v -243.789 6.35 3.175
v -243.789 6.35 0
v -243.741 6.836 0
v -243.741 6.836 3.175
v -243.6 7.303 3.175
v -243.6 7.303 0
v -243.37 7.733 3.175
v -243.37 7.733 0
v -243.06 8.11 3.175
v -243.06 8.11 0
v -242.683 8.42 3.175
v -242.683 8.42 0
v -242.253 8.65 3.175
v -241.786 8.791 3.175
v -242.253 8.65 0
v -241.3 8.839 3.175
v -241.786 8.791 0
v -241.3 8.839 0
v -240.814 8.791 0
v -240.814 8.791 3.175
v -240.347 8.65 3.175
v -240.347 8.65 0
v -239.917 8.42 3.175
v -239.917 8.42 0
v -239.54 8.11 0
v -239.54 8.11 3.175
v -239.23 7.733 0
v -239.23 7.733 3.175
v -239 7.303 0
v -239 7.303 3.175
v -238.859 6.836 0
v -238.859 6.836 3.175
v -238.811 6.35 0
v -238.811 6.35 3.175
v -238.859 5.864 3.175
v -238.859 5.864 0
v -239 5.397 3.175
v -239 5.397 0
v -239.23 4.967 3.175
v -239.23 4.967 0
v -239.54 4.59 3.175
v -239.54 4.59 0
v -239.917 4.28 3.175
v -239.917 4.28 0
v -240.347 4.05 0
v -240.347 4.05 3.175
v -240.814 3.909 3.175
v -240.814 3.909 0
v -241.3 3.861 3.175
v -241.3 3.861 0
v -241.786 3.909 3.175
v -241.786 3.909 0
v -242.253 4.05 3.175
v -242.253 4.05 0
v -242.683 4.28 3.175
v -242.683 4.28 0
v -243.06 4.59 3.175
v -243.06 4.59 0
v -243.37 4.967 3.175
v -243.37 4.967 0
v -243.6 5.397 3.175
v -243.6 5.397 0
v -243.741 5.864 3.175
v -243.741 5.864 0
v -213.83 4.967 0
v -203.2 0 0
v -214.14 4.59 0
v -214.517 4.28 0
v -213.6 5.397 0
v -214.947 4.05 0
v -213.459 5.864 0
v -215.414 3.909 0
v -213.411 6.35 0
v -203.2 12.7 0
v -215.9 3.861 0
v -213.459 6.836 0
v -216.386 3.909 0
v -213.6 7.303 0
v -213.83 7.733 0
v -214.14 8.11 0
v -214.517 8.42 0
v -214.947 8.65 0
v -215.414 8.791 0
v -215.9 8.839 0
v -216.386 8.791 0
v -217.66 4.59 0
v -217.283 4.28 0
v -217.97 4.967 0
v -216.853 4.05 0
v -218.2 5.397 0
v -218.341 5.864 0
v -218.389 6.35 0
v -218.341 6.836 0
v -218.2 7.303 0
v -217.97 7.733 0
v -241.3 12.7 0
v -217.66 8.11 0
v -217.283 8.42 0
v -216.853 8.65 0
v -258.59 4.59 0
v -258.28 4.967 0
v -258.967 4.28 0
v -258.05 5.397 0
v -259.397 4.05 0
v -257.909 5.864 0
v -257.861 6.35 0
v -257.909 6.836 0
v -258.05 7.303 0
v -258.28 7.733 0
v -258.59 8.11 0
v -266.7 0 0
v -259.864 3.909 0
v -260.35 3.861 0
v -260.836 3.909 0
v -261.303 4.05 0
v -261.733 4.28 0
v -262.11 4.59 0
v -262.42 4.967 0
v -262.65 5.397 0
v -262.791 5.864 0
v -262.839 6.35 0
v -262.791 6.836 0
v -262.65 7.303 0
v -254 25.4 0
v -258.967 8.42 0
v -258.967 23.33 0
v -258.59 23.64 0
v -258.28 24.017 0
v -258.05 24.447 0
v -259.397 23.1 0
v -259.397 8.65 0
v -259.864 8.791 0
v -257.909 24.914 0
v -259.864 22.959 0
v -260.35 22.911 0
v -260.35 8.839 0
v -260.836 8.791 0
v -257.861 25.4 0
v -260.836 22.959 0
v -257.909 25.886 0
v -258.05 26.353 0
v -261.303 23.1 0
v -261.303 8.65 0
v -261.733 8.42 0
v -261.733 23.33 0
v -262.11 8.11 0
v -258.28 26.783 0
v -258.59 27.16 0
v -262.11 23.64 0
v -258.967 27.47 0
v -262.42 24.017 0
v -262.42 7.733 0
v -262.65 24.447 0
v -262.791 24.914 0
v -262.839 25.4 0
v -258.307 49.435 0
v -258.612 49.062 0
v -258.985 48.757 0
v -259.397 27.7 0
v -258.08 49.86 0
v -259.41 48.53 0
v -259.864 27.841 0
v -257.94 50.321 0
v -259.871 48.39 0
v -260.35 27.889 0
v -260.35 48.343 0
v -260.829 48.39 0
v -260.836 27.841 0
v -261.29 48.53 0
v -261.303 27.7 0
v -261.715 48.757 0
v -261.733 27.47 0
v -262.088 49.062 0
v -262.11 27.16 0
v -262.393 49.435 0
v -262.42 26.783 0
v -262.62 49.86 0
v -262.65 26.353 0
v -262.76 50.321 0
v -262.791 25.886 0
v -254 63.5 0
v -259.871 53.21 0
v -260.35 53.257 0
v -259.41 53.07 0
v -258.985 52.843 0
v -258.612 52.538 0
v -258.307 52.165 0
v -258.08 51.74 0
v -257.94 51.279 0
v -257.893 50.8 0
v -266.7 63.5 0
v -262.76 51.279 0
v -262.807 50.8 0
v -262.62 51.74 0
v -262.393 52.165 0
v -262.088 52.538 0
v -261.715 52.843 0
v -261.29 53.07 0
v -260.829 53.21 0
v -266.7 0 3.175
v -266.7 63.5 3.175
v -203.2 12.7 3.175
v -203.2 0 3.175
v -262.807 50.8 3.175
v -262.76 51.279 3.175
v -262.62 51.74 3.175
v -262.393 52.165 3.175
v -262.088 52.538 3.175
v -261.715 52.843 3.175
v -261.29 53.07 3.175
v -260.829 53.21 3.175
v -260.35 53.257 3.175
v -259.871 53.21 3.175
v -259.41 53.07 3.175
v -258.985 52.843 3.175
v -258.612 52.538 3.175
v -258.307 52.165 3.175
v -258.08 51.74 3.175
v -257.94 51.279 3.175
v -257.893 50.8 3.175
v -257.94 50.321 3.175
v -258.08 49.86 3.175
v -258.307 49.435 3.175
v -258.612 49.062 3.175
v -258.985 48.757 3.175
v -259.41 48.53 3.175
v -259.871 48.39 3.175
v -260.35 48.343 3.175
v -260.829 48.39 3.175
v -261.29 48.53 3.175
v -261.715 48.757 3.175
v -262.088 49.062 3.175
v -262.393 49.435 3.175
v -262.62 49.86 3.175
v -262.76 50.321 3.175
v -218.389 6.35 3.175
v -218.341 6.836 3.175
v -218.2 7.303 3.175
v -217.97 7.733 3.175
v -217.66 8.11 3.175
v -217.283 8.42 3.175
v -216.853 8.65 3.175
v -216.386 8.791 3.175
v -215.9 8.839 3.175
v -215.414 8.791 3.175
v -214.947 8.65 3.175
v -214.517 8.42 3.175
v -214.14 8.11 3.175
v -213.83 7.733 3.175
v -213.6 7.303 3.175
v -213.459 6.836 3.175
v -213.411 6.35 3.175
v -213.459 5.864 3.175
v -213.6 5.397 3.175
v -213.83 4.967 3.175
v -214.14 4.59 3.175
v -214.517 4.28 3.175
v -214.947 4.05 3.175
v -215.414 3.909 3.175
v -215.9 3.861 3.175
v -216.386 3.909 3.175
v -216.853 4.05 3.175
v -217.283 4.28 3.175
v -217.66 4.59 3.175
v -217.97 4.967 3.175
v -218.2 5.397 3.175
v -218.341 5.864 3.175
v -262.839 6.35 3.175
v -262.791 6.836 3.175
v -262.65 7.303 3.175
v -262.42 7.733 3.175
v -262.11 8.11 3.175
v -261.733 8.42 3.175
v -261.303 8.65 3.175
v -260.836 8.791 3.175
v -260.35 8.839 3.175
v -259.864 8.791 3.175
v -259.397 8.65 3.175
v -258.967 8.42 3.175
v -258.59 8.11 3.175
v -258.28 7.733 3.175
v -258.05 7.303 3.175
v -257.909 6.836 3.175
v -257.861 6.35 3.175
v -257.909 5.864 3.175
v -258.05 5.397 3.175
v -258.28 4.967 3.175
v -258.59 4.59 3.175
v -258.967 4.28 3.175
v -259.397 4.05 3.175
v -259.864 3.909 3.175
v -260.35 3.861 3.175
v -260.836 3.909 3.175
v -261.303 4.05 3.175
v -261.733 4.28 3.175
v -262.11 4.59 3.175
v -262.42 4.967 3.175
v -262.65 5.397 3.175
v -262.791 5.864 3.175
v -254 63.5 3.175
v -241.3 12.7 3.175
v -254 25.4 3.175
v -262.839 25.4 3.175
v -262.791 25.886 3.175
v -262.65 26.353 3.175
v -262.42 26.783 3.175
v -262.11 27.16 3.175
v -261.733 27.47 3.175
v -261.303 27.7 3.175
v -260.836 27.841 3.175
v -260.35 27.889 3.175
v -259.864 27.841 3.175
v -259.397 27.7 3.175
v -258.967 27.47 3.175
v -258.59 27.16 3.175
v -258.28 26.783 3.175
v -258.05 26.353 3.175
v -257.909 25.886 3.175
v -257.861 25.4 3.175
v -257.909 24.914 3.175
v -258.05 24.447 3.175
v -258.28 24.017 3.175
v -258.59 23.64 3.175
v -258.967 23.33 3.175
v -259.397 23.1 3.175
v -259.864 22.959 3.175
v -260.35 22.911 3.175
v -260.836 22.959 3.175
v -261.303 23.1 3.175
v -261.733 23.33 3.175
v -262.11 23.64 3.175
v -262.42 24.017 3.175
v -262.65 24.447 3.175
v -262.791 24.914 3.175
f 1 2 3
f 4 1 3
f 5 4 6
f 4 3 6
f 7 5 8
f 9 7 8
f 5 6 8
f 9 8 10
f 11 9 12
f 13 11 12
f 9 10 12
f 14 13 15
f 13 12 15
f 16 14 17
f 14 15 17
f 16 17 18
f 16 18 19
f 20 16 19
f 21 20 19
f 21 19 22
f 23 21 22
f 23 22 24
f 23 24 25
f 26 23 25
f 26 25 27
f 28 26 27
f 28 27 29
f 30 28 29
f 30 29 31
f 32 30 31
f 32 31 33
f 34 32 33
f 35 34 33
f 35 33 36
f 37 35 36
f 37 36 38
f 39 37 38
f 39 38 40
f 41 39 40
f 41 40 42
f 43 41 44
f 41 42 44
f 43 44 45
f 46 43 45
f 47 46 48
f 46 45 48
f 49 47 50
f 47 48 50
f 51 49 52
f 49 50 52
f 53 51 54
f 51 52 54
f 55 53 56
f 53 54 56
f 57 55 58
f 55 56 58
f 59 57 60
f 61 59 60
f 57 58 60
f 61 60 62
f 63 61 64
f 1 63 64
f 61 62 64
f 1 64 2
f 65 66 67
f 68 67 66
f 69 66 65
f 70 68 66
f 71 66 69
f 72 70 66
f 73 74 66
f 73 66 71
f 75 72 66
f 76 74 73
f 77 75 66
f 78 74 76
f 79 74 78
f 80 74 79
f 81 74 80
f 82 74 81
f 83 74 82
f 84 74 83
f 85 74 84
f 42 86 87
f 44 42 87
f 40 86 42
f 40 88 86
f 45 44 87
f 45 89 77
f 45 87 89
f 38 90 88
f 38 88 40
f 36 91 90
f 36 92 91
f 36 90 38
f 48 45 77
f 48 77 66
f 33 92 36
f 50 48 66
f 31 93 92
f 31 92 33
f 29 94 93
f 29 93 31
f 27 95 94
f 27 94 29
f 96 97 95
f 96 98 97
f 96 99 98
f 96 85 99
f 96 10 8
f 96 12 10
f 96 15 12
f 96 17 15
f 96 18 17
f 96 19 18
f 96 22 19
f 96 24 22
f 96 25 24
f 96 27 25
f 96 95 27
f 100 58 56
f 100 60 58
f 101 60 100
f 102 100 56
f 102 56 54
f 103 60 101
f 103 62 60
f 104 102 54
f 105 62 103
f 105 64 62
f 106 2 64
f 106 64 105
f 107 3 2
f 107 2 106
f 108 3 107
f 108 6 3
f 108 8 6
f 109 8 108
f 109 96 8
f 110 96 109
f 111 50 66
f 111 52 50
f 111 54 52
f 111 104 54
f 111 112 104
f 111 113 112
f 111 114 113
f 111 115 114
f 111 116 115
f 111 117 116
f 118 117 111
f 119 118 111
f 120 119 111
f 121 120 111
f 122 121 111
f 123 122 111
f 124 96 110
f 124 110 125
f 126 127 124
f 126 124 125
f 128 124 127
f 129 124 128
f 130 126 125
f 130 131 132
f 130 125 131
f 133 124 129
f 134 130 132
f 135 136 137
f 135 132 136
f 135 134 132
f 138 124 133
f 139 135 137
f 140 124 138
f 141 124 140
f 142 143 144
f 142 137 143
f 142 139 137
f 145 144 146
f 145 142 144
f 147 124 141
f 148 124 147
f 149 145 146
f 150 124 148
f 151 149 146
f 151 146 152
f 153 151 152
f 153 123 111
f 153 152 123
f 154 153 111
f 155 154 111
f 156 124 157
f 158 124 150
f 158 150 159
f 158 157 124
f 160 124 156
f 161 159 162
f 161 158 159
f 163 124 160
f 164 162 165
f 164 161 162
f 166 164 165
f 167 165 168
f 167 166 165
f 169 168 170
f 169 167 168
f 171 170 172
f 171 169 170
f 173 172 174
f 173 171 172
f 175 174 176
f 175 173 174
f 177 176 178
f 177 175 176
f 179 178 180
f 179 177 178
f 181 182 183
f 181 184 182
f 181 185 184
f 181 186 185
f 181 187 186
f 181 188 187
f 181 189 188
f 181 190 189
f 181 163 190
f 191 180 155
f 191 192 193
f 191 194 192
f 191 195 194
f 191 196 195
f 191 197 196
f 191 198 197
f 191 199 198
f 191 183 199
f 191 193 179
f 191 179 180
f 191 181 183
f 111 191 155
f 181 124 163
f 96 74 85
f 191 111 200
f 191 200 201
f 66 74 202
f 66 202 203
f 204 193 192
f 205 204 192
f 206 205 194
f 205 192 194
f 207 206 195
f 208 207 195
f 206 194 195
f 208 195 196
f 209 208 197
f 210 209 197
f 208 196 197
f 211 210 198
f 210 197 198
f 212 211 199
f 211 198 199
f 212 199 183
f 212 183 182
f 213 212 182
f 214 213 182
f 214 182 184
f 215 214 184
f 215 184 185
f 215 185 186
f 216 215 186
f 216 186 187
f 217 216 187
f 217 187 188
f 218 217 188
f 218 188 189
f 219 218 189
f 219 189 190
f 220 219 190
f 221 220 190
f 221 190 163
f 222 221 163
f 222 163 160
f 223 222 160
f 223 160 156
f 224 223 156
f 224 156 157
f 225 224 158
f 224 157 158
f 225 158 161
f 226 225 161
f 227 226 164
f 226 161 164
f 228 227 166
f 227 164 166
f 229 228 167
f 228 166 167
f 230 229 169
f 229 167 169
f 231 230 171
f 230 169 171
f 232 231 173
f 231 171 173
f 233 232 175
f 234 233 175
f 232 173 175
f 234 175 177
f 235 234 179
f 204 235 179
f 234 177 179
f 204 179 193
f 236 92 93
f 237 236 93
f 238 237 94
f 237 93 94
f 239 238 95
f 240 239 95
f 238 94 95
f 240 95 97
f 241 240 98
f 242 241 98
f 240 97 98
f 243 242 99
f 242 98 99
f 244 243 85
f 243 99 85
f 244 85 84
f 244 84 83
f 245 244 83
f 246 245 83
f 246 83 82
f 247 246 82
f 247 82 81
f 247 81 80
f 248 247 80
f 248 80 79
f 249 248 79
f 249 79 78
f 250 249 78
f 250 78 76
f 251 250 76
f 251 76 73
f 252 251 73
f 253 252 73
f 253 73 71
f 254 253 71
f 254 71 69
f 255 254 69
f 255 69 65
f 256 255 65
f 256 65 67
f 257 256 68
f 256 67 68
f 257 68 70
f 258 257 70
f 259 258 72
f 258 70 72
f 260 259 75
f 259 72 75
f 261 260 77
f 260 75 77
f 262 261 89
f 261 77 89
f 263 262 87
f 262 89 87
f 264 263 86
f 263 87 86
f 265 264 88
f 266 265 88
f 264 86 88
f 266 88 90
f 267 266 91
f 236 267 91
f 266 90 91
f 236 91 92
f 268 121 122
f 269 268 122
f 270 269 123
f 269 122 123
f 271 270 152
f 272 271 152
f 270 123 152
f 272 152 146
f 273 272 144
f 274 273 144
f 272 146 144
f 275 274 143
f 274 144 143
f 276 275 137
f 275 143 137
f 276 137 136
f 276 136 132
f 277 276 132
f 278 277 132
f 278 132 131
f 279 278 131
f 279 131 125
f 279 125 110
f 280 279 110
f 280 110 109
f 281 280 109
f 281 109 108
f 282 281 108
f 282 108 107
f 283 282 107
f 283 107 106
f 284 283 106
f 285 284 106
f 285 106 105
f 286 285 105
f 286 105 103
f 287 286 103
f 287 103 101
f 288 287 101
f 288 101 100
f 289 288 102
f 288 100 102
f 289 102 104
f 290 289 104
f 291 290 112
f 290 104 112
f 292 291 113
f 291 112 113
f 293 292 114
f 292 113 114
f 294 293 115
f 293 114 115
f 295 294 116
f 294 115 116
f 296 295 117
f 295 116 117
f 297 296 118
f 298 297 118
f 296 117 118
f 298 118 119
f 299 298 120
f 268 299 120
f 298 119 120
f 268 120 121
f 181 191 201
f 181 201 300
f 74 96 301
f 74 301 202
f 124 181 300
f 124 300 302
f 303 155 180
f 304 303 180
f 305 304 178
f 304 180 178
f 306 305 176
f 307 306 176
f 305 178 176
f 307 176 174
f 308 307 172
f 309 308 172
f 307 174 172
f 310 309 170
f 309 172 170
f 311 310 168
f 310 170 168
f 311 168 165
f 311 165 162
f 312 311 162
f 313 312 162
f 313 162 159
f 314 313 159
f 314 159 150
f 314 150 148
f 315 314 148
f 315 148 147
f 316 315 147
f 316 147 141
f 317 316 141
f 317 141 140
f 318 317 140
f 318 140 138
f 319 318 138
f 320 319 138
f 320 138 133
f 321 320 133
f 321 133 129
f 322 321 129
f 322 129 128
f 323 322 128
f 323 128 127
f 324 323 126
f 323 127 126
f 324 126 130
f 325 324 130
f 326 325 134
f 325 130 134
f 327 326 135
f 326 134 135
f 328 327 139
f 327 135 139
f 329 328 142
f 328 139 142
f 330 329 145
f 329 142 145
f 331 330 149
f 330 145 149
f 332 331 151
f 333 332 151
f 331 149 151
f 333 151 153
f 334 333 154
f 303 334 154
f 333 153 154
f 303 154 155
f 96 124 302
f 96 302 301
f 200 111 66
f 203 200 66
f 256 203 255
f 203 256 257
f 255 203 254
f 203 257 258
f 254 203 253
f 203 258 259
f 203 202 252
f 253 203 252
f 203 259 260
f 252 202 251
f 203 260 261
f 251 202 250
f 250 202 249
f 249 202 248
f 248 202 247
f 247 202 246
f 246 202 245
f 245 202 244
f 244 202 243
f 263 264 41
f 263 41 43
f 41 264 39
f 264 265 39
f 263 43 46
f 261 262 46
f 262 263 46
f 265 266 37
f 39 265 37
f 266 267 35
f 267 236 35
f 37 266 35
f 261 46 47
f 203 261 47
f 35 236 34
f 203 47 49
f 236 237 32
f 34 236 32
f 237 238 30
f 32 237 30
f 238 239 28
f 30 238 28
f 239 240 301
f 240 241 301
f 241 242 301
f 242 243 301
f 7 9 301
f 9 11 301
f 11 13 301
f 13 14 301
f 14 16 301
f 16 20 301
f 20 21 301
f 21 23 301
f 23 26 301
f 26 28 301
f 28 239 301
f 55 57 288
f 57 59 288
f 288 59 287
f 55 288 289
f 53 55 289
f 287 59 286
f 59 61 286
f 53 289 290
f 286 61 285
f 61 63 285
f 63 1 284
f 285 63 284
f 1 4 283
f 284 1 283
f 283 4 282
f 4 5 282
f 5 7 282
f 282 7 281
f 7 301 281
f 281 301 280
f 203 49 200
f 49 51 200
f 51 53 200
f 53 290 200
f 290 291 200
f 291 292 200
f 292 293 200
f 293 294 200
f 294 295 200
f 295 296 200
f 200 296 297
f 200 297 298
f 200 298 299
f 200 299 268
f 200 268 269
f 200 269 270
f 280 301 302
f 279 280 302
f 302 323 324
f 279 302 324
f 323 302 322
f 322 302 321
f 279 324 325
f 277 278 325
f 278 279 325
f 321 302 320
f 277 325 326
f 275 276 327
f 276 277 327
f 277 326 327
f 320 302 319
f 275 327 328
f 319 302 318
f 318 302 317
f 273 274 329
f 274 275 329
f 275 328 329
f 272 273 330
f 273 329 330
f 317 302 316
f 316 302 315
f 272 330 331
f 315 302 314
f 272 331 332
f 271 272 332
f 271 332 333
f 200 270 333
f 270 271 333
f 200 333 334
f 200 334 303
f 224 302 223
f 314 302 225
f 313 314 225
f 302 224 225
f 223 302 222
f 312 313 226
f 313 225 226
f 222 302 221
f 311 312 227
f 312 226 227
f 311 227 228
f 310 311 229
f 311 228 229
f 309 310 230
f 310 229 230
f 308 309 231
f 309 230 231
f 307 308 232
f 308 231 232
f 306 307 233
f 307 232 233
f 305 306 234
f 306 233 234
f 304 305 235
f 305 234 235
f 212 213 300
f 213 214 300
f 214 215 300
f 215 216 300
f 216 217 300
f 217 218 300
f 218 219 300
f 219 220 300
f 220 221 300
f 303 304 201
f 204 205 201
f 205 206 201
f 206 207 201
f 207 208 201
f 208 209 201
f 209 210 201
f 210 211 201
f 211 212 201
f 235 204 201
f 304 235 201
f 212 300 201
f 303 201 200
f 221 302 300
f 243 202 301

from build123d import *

# Parameters (mm, degrees)
BOSS_EXTRUDE1_DEPTH          = 3.175
F_10_CLEARANCE_HOLE1_D       = 4.9784
F_10_0_1935_DIAMETER_HOLE1_D = 4.9149


with BuildPart() as part:
    # Sketch1 → Boss-Extrude1 (new body)
    with BuildSketch(Plane.XY):
        Polygon((-253.5966335, 0), (-266.700000508, 0), (-266.700000508, 63.5), (-254.000000508, 63.5), (-254.000000508, 25.4), (-241.300000508, 12.7), (-203.200000508, 12.7), (-203.200000508, 0), align=None)
    extrude(amount=BOSS_EXTRUDE1_DEPTH)

    # #10 Clearance Hole1 (through all)
    with Locations(Plane.XY.offset(3.175)):
        with Locations((-260.350000508, 6.35), (-260.350000508, 25.4), (-241.300000508, 6.35), (-215.900000508, 6.35)):
            Hole(F_10_CLEARANCE_HOLE1_D / 2)

    # #10 (0.1935) Diameter Hole1 (through all)
    with Locations(Plane.XY.offset(3.175)):
        with Locations((-260.350000508, 50.8)):
            Hole(F_10_0_1935_DIAMETER_HOLE1_D / 2)


solid = part.part
